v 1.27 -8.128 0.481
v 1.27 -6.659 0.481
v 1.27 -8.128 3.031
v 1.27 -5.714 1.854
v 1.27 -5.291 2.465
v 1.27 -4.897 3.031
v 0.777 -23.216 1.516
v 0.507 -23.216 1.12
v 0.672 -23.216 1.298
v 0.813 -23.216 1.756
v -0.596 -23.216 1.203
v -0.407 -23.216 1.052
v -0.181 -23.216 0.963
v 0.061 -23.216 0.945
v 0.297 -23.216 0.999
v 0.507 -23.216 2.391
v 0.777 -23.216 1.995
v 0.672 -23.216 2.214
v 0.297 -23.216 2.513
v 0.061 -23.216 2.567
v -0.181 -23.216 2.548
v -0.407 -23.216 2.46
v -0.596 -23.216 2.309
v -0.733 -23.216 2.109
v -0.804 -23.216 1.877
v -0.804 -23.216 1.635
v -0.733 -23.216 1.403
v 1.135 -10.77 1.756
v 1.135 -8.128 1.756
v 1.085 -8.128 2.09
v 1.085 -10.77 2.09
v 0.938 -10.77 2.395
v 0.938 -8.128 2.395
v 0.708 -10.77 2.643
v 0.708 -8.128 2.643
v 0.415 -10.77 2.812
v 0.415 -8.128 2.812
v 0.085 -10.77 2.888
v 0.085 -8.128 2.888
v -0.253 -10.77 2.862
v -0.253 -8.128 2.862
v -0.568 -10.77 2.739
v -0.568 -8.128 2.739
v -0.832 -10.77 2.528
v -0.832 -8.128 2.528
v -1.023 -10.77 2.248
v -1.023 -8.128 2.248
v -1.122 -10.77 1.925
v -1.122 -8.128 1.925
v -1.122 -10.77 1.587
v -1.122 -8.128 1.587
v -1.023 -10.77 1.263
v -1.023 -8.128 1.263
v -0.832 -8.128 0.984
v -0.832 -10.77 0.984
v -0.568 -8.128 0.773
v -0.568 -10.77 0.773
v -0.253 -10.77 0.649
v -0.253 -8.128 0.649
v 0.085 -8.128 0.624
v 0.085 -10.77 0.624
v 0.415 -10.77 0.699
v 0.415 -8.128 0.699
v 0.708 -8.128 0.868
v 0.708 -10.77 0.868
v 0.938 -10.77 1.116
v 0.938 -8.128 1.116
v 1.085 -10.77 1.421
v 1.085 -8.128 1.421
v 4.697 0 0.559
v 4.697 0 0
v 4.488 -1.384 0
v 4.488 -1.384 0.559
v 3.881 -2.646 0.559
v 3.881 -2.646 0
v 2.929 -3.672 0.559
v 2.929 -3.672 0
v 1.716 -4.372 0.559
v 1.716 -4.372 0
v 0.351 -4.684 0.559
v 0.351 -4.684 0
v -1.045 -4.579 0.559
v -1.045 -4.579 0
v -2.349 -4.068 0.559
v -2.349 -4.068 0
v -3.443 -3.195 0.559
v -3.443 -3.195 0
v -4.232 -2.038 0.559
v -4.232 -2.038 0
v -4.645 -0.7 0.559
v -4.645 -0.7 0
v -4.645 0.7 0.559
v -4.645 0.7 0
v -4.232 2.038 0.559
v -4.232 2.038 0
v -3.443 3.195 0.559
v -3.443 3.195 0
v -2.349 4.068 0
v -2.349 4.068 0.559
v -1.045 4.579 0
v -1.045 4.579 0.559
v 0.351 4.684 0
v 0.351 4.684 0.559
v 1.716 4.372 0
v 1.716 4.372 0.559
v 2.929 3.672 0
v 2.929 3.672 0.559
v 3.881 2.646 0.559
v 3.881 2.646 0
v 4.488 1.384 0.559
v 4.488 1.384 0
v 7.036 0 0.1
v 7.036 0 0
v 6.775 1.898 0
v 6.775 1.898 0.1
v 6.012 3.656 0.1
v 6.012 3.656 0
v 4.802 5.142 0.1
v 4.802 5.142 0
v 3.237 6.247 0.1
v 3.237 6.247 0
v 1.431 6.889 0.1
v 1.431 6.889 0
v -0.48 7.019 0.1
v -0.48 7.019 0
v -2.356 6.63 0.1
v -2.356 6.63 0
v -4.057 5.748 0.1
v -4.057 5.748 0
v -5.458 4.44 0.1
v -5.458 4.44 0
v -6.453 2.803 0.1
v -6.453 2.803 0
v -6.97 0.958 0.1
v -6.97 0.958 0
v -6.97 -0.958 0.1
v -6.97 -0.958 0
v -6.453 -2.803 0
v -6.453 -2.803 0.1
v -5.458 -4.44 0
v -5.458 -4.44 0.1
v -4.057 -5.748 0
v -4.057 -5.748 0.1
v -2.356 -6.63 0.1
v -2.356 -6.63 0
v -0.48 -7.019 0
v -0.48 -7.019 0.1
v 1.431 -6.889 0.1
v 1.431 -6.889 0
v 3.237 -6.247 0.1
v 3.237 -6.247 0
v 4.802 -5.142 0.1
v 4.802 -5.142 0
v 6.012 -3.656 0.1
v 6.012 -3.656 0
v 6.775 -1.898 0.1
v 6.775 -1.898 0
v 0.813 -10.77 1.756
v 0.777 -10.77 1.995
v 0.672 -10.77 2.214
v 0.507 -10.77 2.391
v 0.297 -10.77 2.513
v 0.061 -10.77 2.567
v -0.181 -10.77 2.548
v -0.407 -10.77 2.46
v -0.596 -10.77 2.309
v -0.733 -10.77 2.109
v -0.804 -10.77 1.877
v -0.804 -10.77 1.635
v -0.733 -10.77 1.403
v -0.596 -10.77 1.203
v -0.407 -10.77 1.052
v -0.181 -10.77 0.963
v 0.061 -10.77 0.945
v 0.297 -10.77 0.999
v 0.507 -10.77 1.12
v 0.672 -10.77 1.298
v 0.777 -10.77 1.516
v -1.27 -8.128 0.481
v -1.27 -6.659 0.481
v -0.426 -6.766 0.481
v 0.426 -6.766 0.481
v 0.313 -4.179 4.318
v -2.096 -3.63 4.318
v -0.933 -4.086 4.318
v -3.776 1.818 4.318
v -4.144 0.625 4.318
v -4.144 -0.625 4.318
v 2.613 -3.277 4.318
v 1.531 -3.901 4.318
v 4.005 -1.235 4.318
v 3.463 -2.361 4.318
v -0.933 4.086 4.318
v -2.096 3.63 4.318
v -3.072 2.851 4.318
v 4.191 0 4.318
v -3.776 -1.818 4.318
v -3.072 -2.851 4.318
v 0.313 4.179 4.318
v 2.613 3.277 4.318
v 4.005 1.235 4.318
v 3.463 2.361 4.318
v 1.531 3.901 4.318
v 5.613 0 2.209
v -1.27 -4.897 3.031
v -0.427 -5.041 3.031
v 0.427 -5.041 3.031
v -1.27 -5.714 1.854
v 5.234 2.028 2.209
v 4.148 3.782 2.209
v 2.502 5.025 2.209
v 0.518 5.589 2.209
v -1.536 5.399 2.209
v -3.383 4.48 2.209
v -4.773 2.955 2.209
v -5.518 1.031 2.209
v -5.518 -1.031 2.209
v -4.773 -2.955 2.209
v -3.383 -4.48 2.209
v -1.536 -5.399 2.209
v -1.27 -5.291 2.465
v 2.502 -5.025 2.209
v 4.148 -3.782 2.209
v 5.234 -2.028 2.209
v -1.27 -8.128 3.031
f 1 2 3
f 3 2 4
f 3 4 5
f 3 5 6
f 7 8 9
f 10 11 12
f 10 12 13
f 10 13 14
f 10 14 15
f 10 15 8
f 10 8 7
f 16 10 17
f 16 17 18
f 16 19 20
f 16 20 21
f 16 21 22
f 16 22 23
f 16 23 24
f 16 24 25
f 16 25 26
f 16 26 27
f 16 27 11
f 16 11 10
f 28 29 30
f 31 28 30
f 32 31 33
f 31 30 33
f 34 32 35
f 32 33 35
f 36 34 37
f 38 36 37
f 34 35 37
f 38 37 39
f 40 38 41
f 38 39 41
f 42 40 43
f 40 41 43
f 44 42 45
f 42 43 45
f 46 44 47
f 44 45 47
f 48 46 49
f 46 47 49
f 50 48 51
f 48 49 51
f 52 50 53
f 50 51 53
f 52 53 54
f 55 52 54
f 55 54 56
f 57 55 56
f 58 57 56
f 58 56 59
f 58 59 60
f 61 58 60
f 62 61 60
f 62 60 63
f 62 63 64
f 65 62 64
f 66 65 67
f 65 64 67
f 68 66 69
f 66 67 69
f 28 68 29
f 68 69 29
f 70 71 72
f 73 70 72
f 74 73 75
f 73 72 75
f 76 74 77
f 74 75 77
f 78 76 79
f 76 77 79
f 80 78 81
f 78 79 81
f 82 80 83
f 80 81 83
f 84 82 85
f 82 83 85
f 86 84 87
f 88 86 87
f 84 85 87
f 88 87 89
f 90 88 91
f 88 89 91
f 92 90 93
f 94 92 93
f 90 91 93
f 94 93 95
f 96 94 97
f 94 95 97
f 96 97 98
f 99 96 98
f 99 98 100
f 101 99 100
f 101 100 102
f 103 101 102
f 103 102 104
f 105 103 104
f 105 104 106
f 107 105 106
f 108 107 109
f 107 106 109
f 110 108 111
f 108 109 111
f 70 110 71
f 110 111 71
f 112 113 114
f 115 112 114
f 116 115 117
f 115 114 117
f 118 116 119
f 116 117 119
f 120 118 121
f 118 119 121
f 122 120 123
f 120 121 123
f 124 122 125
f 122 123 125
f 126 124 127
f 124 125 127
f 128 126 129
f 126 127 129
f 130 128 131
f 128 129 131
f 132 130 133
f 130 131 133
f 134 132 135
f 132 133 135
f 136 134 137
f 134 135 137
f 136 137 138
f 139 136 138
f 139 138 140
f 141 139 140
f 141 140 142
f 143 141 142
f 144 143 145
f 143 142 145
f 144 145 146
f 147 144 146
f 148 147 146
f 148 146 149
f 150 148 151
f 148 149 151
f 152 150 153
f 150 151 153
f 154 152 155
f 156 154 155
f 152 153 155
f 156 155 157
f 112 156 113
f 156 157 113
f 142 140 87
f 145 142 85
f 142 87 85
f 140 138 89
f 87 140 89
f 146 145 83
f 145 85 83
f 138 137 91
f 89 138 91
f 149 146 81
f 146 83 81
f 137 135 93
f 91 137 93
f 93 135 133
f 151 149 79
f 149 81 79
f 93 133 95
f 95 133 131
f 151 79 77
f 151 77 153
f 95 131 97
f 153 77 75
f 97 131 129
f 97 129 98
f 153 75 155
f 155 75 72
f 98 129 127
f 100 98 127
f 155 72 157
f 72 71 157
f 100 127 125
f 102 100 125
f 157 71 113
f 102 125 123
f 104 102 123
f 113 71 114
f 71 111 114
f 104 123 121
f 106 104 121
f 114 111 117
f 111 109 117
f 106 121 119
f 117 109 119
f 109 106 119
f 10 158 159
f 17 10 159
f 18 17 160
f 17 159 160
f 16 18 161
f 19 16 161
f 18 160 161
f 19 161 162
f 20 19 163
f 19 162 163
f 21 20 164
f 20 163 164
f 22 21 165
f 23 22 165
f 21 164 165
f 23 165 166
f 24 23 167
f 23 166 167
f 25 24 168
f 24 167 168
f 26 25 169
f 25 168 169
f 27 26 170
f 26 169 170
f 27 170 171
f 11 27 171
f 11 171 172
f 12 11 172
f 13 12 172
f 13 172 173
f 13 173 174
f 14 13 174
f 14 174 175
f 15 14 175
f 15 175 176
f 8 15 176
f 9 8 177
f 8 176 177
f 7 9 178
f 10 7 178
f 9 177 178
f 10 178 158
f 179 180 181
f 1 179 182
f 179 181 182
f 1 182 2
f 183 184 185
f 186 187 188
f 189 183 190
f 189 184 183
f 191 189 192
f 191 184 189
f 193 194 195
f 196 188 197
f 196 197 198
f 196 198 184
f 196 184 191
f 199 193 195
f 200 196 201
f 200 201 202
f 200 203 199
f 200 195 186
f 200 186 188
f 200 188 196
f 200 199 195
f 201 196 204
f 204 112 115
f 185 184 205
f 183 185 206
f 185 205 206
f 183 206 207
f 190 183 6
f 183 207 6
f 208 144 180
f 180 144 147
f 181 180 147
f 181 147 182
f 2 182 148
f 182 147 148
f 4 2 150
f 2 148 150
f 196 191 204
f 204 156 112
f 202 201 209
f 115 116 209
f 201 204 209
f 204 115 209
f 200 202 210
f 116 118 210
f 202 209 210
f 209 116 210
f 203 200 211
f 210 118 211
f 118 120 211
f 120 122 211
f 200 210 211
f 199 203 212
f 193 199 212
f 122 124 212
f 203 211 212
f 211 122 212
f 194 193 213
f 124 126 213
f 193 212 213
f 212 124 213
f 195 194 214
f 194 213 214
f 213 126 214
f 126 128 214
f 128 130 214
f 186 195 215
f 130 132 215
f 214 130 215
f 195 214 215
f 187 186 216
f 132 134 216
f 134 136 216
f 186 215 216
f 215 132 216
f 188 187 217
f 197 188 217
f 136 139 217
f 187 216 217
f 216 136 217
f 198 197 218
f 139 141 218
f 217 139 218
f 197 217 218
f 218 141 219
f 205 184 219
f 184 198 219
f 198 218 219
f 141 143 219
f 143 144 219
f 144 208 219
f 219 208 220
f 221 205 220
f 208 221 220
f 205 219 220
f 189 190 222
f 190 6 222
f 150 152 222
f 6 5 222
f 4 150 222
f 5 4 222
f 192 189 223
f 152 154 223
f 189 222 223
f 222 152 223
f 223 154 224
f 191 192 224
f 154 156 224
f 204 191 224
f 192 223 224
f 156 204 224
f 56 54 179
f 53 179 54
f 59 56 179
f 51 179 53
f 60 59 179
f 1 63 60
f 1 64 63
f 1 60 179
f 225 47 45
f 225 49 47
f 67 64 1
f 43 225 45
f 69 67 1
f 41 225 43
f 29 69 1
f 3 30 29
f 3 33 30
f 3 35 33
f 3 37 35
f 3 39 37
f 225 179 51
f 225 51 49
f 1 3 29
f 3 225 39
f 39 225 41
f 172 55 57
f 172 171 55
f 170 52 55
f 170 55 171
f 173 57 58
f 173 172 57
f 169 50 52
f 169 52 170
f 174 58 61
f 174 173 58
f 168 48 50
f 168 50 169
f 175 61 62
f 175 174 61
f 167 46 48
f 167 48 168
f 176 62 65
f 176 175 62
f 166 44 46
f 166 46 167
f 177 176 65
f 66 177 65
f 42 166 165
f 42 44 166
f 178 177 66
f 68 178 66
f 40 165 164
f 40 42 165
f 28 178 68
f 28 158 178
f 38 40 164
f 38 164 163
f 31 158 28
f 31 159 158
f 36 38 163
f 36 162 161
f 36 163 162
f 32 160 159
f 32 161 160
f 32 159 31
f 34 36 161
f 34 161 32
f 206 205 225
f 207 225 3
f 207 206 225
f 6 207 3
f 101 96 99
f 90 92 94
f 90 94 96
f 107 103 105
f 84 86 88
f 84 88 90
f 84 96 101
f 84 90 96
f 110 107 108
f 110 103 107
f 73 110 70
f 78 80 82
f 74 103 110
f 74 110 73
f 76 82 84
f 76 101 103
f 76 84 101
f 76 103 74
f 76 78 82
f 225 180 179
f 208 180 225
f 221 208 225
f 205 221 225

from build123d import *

# Parameters (mm, degrees)
F0_R      = 7.0358
F1_DEPTH  = 4.318
F2_SIZE2  = 4.2175894432
F2_SIZE   = 2.8448
F3_W      = 2.54
F3_H      = 2.5500503834
F4_DEPTH  = 8.128
F5_R      = 1.1351249509
F6_DEPTH  = 2.6416
F7_R      = 4.6971074758
F8_DEPTH  = 0.5588
F9_R      = 0.8130420693
F10_DEPTH = 12.446


with BuildPart() as f1:
    # F0 (on Top) → F1 (new body)
    with BuildSketch(Plane.XY):
        Circle(F0_R)
    extrude(amount=F1_DEPTH)

    # F2
    f2_edges = [f1.edges().sort_by_distance(p)[0] for p in [
        (-7.0358, 0, 4.318),
    ]]
    f2_side = f1.faces().sort_by_distance((0, 0, 4.318))[0]
    chamfer(f2_edges, length=F2_SIZE, length2=F2_SIZE2, reference=f2_side)

    # F3 (on Front) → F4 (join)
    with BuildSketch(Plane.XZ):
        with Locations((0, 1.7557573738)):
            Rectangle(F3_W, F3_H)
    extrude(amount=F4_DEPTH)

    # F5 (on face) → F6 (join)
    with BuildSketch(Plane.XZ.offset(8.128)):
        with Locations((0, 1.7557573738)):
            Circle(F5_R)
    extrude(amount=F6_DEPTH)

    # F7 (on face) → F8 (cut)
    with BuildSketch(Plane(origin=(0, 0, 0), x_dir=(1, 0, 0), z_dir=(0, 0, -1))):
        Circle(F7_R)
    extrude(amount=-F8_DEPTH, mode=Mode.SUBTRACT)

    # F9 (on face) → F10 (join)
    with BuildSketch(Plane.XZ.offset(10.7696)):
        with Locations((0, 1.7557573738)):
            Circle(F9_R)
    extrude(amount=F10_DEPTH)


solid = f1.part
